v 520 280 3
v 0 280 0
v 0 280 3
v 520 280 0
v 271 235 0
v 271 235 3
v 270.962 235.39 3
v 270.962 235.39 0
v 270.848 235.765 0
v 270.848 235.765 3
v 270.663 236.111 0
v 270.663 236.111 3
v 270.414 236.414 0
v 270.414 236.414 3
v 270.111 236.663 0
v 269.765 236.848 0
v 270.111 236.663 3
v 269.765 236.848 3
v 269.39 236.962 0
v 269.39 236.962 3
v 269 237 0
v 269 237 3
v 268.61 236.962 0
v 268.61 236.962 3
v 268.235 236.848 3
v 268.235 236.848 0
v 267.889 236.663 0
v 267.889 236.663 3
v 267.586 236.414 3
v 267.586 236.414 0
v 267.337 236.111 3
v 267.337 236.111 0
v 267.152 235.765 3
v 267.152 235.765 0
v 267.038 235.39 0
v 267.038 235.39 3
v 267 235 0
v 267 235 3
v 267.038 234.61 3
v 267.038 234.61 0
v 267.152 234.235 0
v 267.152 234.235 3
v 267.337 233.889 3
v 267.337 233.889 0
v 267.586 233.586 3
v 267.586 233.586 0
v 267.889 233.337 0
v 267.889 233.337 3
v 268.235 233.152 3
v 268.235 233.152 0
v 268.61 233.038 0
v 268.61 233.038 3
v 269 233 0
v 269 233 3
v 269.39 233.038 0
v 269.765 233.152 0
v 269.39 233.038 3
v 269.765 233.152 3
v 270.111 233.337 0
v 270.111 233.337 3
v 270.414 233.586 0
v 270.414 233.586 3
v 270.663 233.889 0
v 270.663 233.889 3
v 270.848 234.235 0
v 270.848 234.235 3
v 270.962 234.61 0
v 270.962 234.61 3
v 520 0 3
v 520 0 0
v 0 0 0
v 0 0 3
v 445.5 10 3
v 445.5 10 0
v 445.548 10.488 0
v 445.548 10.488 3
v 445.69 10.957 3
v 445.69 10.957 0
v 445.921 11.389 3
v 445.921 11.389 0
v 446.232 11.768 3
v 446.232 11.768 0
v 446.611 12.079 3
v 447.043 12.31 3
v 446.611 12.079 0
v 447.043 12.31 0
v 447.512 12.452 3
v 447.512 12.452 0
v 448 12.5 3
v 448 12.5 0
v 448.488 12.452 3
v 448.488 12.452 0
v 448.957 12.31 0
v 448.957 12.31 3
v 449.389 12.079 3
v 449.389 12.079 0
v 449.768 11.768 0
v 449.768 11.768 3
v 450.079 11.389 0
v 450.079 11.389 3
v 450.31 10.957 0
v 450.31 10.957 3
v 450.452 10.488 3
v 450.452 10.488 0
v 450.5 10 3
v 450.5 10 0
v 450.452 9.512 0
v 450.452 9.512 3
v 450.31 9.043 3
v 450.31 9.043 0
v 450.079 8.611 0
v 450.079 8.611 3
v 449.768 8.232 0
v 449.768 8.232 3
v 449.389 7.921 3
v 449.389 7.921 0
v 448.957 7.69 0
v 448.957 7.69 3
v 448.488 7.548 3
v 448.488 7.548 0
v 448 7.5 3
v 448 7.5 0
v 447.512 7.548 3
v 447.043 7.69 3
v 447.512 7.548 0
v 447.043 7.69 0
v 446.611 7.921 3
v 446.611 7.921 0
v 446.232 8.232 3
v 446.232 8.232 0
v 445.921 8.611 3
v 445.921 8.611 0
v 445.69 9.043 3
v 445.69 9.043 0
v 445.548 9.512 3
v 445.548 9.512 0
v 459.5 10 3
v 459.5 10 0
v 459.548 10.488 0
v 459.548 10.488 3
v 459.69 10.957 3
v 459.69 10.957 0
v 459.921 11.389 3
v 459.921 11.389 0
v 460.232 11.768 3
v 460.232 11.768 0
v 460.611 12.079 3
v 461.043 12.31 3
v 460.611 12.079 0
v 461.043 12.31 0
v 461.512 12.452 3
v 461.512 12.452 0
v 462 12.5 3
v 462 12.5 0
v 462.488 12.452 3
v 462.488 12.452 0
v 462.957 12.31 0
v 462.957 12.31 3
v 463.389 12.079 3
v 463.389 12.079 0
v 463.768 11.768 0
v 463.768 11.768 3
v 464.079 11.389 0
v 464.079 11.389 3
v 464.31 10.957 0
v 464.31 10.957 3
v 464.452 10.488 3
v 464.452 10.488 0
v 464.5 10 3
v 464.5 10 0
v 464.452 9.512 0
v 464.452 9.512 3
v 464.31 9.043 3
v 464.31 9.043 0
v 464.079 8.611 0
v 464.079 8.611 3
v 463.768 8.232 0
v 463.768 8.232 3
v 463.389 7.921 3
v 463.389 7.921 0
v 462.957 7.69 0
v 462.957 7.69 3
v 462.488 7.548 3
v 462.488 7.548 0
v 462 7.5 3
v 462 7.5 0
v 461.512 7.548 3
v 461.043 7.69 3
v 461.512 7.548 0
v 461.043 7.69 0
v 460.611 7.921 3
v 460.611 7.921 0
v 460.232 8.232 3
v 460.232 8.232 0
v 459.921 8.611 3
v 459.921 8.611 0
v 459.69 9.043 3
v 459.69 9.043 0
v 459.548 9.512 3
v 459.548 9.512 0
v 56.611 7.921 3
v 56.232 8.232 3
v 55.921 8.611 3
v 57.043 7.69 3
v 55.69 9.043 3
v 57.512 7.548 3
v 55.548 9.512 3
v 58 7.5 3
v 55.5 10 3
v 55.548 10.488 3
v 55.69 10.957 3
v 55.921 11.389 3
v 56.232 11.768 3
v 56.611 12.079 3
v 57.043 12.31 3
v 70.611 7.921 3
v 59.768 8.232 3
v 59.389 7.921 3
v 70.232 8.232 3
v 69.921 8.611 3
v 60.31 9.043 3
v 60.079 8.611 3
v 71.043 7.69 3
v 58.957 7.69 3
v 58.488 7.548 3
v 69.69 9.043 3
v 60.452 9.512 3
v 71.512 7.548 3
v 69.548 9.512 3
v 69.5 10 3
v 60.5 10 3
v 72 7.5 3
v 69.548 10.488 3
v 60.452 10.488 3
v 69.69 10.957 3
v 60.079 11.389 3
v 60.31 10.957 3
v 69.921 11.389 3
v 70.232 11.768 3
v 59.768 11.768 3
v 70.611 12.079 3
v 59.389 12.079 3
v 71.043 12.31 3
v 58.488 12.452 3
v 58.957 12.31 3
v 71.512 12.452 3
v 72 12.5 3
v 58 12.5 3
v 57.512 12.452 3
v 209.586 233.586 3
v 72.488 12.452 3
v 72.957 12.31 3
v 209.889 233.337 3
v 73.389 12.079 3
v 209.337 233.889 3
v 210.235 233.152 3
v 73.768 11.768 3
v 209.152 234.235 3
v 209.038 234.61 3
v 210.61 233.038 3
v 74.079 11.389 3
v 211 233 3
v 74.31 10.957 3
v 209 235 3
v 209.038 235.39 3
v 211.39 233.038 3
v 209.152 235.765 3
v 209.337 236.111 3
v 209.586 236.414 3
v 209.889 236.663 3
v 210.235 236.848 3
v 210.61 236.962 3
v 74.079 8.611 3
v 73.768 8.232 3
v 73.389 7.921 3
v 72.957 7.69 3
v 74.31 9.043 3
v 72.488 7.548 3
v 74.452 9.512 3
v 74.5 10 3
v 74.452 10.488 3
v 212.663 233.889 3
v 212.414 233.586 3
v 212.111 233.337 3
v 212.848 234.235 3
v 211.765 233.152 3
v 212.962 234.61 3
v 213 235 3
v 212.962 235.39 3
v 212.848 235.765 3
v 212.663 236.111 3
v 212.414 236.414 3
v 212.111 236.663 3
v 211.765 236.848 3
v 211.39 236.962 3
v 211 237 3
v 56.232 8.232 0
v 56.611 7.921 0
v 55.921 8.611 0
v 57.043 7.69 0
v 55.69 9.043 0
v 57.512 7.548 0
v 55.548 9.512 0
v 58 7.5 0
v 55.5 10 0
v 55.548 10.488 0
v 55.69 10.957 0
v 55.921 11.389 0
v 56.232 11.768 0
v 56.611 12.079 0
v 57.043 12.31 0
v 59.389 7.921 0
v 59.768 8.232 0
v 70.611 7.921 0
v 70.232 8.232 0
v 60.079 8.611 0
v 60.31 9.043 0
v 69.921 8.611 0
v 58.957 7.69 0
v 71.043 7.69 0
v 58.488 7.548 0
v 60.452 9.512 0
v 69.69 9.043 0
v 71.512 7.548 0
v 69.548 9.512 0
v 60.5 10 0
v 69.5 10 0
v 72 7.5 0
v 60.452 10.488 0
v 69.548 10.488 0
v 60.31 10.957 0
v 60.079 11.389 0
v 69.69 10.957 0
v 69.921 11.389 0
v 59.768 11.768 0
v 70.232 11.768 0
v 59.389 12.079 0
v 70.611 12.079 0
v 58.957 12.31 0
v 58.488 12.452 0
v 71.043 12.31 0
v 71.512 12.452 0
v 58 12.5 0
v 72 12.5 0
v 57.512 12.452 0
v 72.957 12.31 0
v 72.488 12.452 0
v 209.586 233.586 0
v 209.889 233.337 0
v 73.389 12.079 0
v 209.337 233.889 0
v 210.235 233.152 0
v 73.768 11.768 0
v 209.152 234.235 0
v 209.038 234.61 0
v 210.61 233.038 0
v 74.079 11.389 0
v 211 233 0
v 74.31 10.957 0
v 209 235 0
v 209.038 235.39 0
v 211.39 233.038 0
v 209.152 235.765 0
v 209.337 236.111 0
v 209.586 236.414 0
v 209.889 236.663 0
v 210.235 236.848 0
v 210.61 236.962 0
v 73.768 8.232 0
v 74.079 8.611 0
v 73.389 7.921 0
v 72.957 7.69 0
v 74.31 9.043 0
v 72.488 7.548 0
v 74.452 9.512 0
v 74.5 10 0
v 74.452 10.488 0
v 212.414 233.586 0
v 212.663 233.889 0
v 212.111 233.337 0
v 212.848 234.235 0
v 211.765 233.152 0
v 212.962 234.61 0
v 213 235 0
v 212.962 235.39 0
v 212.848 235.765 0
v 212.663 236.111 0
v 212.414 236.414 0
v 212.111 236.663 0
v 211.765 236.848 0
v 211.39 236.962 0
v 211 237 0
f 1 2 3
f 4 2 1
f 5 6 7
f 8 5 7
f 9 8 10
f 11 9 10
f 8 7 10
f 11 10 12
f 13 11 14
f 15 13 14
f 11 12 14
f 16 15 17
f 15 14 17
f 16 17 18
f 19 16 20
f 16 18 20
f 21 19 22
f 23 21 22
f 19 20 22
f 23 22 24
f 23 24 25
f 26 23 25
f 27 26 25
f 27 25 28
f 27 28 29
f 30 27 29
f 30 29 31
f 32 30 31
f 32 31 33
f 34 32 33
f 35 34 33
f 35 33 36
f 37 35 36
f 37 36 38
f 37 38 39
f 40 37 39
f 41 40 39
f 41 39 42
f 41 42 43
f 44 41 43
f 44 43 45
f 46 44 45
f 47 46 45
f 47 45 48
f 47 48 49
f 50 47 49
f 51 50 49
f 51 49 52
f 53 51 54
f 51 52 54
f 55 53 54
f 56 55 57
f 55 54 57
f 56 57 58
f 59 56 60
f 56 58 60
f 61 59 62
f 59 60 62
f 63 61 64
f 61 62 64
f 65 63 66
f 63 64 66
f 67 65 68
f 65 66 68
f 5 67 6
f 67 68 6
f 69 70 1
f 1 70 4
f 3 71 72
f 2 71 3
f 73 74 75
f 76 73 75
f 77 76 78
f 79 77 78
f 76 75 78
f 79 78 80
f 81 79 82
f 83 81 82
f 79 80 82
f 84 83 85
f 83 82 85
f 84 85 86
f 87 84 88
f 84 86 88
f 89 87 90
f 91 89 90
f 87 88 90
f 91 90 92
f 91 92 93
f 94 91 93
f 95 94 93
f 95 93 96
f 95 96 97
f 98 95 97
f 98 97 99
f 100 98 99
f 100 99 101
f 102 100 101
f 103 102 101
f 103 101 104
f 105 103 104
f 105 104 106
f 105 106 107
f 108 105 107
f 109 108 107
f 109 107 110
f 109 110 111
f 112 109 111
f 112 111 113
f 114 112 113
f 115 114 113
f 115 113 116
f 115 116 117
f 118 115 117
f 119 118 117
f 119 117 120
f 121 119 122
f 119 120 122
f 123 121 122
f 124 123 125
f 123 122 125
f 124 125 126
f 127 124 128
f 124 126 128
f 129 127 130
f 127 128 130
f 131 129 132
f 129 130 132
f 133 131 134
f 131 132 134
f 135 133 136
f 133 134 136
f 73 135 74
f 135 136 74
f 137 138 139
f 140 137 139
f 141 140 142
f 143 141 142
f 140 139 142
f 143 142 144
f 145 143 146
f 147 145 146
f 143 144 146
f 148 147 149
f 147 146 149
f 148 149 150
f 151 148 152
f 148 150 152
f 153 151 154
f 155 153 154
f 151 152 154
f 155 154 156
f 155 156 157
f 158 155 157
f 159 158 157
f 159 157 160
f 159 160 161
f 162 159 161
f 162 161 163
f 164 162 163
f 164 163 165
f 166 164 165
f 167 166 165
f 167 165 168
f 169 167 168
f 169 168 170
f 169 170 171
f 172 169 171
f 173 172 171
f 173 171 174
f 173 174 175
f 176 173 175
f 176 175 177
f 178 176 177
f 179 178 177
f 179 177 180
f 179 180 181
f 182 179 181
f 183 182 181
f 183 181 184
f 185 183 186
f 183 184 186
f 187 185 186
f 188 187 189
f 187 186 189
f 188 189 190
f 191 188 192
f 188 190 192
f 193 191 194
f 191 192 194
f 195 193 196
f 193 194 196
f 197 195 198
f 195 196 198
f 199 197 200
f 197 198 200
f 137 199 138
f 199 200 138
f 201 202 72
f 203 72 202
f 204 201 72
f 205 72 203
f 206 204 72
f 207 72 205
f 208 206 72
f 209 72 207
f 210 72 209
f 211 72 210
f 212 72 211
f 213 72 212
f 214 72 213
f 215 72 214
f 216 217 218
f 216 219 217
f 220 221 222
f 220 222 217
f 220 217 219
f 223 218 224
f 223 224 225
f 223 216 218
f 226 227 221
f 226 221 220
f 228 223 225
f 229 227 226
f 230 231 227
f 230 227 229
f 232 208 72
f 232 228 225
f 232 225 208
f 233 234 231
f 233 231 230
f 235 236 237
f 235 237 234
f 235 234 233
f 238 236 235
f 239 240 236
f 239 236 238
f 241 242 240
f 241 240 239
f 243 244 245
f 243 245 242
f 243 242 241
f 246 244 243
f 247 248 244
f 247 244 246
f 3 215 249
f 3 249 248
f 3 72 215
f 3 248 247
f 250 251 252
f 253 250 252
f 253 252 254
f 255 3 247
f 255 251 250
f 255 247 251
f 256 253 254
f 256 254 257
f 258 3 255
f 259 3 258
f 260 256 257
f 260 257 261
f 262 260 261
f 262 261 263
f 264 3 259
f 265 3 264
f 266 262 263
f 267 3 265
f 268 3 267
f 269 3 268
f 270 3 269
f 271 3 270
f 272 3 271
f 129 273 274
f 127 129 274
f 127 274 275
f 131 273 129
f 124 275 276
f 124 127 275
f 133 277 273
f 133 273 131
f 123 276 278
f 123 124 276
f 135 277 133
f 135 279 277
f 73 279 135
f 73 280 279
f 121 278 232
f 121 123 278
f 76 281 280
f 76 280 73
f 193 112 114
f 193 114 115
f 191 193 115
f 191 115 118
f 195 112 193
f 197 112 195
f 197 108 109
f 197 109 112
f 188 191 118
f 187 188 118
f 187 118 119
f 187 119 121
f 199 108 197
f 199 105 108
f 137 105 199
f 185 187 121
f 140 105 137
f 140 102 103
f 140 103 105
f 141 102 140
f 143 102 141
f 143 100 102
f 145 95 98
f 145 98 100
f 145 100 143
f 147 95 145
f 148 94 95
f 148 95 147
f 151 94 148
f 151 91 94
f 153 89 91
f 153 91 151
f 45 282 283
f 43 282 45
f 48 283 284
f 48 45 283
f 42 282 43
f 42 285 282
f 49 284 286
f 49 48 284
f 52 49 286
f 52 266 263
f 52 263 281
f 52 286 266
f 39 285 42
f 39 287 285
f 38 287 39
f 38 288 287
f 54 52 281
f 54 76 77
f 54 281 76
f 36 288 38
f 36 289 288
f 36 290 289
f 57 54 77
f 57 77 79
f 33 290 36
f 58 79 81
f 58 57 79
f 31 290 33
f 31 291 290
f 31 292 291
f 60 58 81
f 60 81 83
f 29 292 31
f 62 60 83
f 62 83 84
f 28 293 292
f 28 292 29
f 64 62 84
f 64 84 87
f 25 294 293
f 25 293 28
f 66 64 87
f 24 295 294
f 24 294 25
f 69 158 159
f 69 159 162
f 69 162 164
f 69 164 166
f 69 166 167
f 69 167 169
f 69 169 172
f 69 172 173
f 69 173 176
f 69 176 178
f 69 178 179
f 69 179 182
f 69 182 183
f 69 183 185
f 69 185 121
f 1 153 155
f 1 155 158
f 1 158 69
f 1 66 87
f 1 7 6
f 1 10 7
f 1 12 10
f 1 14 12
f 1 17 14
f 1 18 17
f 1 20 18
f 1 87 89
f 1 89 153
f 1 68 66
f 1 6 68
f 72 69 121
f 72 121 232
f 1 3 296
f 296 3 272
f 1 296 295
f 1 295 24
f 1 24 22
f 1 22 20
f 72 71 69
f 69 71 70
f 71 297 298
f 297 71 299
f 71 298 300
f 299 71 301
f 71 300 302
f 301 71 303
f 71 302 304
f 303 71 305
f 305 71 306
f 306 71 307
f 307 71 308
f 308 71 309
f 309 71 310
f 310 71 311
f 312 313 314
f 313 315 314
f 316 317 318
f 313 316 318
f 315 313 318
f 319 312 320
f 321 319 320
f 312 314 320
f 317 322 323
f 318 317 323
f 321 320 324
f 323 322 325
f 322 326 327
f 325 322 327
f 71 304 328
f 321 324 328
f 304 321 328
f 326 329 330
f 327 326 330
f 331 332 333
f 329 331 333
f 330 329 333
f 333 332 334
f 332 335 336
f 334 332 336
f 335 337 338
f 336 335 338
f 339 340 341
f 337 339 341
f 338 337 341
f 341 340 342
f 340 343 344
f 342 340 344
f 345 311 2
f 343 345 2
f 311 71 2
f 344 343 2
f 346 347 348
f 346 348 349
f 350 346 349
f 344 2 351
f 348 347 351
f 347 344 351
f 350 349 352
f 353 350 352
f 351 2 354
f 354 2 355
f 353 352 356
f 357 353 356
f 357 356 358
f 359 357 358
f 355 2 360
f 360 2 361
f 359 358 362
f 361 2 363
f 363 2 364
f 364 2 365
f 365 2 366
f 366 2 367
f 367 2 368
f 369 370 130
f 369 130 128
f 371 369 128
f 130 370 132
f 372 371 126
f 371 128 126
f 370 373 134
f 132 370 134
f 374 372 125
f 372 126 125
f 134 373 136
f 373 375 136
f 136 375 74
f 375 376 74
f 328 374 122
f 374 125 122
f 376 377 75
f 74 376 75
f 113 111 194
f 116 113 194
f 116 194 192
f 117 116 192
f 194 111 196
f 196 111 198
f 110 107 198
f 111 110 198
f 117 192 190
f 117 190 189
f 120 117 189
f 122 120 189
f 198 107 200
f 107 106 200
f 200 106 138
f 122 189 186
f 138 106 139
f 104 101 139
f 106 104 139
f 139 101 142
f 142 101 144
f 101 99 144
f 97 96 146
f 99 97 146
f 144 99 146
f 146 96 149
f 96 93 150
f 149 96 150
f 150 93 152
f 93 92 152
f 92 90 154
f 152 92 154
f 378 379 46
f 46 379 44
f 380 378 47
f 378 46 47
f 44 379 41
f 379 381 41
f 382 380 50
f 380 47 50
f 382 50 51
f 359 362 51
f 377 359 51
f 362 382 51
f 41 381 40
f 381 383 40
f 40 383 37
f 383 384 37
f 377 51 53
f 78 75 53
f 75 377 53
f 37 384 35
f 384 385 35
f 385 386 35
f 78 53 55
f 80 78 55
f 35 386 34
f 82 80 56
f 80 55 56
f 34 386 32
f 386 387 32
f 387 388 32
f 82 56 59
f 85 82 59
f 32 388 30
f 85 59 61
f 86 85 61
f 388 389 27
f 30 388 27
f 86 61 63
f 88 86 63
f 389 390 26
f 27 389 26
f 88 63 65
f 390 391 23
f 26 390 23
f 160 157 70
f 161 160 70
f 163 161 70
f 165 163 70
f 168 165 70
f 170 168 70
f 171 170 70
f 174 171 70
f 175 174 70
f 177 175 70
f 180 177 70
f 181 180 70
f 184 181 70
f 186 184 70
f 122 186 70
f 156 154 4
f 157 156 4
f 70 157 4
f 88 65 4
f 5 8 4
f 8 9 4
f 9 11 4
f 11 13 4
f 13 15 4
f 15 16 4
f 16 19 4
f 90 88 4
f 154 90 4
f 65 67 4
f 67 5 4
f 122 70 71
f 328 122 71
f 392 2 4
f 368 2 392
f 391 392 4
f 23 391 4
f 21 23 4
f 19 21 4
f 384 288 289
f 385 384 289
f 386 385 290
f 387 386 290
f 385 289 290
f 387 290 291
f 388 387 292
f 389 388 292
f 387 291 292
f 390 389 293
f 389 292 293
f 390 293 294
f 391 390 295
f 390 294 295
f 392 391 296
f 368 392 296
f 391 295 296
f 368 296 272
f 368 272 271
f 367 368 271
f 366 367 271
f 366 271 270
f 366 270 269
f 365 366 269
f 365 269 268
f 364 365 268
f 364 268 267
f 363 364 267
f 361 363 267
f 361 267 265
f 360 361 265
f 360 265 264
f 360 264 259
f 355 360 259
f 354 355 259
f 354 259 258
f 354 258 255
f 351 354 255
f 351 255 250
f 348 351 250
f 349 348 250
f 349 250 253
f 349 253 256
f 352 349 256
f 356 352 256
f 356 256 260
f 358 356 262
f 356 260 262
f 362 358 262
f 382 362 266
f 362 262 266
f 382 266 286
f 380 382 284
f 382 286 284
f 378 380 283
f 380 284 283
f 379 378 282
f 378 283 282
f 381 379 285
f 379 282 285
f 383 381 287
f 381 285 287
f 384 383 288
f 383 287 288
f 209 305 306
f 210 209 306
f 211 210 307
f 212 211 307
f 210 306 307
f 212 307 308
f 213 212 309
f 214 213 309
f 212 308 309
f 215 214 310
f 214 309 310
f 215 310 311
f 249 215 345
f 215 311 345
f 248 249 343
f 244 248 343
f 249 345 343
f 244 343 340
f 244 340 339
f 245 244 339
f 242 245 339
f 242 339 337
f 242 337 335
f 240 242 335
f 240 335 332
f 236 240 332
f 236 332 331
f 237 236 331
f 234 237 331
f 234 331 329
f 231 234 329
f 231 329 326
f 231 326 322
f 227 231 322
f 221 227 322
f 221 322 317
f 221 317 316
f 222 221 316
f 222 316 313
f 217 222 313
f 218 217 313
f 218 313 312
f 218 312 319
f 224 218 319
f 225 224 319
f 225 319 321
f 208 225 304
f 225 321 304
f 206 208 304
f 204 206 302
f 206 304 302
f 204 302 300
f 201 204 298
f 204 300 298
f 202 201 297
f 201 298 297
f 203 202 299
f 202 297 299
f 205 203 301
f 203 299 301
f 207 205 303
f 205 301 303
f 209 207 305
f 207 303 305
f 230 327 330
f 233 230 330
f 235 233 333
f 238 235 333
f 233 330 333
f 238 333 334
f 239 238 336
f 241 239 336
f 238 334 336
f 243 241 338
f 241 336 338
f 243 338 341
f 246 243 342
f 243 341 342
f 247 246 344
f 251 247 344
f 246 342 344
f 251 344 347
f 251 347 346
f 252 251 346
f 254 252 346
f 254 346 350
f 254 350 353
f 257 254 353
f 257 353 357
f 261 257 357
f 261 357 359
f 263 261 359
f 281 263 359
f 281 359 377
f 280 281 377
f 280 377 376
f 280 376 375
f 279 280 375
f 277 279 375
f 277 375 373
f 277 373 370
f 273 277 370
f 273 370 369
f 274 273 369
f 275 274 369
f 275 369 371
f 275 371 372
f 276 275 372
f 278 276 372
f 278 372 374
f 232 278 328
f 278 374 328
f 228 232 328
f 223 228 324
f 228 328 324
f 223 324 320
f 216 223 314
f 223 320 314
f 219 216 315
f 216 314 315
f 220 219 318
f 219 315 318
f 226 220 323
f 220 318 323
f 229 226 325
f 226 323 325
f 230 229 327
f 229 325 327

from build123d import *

# Parameters (mm, degrees)
SKETCH1_W             = 520
SKETCH1_H             = 280
BOSS_EXTRUDE1_DEPTH   = 3
F_5_0MM_DOWEL_HOLE1_D = 5
F_4_0MM_DOWEL_HOLE1_D = 4


with BuildPart() as part:
    # Sketch1 → Boss-Extrude1 (new body)
    with BuildSketch(Plane.XY):
        with Locations((260, 140)):
            Rectangle(SKETCH1_W, SKETCH1_H)
    extrude(amount=BOSS_EXTRUDE1_DEPTH)

    # Ø5.0mm Dowel Hole1 (through all)
    with Locations(Plane.XY.offset(3)):
        with Locations((461.999997675, 10.000001609), (447.999997675, 10.000001609), (71.999997675, 10.000001609), (57.999997675, 10.000001609)):
            Hole(F_5_0MM_DOWEL_HOLE1_D / 2)

    # Ø4.0mm Dowel Hole1 (through all)
    with Locations(Plane(origin=(0, 0, 0), x_dir=(-1, 0, 0), z_dir=(0, 0, -1))):
        with Locations((-269, 235), (-211, 235)):
            Hole(F_4_0MM_DOWEL_HOLE1_D / 2)


solid = part.part
